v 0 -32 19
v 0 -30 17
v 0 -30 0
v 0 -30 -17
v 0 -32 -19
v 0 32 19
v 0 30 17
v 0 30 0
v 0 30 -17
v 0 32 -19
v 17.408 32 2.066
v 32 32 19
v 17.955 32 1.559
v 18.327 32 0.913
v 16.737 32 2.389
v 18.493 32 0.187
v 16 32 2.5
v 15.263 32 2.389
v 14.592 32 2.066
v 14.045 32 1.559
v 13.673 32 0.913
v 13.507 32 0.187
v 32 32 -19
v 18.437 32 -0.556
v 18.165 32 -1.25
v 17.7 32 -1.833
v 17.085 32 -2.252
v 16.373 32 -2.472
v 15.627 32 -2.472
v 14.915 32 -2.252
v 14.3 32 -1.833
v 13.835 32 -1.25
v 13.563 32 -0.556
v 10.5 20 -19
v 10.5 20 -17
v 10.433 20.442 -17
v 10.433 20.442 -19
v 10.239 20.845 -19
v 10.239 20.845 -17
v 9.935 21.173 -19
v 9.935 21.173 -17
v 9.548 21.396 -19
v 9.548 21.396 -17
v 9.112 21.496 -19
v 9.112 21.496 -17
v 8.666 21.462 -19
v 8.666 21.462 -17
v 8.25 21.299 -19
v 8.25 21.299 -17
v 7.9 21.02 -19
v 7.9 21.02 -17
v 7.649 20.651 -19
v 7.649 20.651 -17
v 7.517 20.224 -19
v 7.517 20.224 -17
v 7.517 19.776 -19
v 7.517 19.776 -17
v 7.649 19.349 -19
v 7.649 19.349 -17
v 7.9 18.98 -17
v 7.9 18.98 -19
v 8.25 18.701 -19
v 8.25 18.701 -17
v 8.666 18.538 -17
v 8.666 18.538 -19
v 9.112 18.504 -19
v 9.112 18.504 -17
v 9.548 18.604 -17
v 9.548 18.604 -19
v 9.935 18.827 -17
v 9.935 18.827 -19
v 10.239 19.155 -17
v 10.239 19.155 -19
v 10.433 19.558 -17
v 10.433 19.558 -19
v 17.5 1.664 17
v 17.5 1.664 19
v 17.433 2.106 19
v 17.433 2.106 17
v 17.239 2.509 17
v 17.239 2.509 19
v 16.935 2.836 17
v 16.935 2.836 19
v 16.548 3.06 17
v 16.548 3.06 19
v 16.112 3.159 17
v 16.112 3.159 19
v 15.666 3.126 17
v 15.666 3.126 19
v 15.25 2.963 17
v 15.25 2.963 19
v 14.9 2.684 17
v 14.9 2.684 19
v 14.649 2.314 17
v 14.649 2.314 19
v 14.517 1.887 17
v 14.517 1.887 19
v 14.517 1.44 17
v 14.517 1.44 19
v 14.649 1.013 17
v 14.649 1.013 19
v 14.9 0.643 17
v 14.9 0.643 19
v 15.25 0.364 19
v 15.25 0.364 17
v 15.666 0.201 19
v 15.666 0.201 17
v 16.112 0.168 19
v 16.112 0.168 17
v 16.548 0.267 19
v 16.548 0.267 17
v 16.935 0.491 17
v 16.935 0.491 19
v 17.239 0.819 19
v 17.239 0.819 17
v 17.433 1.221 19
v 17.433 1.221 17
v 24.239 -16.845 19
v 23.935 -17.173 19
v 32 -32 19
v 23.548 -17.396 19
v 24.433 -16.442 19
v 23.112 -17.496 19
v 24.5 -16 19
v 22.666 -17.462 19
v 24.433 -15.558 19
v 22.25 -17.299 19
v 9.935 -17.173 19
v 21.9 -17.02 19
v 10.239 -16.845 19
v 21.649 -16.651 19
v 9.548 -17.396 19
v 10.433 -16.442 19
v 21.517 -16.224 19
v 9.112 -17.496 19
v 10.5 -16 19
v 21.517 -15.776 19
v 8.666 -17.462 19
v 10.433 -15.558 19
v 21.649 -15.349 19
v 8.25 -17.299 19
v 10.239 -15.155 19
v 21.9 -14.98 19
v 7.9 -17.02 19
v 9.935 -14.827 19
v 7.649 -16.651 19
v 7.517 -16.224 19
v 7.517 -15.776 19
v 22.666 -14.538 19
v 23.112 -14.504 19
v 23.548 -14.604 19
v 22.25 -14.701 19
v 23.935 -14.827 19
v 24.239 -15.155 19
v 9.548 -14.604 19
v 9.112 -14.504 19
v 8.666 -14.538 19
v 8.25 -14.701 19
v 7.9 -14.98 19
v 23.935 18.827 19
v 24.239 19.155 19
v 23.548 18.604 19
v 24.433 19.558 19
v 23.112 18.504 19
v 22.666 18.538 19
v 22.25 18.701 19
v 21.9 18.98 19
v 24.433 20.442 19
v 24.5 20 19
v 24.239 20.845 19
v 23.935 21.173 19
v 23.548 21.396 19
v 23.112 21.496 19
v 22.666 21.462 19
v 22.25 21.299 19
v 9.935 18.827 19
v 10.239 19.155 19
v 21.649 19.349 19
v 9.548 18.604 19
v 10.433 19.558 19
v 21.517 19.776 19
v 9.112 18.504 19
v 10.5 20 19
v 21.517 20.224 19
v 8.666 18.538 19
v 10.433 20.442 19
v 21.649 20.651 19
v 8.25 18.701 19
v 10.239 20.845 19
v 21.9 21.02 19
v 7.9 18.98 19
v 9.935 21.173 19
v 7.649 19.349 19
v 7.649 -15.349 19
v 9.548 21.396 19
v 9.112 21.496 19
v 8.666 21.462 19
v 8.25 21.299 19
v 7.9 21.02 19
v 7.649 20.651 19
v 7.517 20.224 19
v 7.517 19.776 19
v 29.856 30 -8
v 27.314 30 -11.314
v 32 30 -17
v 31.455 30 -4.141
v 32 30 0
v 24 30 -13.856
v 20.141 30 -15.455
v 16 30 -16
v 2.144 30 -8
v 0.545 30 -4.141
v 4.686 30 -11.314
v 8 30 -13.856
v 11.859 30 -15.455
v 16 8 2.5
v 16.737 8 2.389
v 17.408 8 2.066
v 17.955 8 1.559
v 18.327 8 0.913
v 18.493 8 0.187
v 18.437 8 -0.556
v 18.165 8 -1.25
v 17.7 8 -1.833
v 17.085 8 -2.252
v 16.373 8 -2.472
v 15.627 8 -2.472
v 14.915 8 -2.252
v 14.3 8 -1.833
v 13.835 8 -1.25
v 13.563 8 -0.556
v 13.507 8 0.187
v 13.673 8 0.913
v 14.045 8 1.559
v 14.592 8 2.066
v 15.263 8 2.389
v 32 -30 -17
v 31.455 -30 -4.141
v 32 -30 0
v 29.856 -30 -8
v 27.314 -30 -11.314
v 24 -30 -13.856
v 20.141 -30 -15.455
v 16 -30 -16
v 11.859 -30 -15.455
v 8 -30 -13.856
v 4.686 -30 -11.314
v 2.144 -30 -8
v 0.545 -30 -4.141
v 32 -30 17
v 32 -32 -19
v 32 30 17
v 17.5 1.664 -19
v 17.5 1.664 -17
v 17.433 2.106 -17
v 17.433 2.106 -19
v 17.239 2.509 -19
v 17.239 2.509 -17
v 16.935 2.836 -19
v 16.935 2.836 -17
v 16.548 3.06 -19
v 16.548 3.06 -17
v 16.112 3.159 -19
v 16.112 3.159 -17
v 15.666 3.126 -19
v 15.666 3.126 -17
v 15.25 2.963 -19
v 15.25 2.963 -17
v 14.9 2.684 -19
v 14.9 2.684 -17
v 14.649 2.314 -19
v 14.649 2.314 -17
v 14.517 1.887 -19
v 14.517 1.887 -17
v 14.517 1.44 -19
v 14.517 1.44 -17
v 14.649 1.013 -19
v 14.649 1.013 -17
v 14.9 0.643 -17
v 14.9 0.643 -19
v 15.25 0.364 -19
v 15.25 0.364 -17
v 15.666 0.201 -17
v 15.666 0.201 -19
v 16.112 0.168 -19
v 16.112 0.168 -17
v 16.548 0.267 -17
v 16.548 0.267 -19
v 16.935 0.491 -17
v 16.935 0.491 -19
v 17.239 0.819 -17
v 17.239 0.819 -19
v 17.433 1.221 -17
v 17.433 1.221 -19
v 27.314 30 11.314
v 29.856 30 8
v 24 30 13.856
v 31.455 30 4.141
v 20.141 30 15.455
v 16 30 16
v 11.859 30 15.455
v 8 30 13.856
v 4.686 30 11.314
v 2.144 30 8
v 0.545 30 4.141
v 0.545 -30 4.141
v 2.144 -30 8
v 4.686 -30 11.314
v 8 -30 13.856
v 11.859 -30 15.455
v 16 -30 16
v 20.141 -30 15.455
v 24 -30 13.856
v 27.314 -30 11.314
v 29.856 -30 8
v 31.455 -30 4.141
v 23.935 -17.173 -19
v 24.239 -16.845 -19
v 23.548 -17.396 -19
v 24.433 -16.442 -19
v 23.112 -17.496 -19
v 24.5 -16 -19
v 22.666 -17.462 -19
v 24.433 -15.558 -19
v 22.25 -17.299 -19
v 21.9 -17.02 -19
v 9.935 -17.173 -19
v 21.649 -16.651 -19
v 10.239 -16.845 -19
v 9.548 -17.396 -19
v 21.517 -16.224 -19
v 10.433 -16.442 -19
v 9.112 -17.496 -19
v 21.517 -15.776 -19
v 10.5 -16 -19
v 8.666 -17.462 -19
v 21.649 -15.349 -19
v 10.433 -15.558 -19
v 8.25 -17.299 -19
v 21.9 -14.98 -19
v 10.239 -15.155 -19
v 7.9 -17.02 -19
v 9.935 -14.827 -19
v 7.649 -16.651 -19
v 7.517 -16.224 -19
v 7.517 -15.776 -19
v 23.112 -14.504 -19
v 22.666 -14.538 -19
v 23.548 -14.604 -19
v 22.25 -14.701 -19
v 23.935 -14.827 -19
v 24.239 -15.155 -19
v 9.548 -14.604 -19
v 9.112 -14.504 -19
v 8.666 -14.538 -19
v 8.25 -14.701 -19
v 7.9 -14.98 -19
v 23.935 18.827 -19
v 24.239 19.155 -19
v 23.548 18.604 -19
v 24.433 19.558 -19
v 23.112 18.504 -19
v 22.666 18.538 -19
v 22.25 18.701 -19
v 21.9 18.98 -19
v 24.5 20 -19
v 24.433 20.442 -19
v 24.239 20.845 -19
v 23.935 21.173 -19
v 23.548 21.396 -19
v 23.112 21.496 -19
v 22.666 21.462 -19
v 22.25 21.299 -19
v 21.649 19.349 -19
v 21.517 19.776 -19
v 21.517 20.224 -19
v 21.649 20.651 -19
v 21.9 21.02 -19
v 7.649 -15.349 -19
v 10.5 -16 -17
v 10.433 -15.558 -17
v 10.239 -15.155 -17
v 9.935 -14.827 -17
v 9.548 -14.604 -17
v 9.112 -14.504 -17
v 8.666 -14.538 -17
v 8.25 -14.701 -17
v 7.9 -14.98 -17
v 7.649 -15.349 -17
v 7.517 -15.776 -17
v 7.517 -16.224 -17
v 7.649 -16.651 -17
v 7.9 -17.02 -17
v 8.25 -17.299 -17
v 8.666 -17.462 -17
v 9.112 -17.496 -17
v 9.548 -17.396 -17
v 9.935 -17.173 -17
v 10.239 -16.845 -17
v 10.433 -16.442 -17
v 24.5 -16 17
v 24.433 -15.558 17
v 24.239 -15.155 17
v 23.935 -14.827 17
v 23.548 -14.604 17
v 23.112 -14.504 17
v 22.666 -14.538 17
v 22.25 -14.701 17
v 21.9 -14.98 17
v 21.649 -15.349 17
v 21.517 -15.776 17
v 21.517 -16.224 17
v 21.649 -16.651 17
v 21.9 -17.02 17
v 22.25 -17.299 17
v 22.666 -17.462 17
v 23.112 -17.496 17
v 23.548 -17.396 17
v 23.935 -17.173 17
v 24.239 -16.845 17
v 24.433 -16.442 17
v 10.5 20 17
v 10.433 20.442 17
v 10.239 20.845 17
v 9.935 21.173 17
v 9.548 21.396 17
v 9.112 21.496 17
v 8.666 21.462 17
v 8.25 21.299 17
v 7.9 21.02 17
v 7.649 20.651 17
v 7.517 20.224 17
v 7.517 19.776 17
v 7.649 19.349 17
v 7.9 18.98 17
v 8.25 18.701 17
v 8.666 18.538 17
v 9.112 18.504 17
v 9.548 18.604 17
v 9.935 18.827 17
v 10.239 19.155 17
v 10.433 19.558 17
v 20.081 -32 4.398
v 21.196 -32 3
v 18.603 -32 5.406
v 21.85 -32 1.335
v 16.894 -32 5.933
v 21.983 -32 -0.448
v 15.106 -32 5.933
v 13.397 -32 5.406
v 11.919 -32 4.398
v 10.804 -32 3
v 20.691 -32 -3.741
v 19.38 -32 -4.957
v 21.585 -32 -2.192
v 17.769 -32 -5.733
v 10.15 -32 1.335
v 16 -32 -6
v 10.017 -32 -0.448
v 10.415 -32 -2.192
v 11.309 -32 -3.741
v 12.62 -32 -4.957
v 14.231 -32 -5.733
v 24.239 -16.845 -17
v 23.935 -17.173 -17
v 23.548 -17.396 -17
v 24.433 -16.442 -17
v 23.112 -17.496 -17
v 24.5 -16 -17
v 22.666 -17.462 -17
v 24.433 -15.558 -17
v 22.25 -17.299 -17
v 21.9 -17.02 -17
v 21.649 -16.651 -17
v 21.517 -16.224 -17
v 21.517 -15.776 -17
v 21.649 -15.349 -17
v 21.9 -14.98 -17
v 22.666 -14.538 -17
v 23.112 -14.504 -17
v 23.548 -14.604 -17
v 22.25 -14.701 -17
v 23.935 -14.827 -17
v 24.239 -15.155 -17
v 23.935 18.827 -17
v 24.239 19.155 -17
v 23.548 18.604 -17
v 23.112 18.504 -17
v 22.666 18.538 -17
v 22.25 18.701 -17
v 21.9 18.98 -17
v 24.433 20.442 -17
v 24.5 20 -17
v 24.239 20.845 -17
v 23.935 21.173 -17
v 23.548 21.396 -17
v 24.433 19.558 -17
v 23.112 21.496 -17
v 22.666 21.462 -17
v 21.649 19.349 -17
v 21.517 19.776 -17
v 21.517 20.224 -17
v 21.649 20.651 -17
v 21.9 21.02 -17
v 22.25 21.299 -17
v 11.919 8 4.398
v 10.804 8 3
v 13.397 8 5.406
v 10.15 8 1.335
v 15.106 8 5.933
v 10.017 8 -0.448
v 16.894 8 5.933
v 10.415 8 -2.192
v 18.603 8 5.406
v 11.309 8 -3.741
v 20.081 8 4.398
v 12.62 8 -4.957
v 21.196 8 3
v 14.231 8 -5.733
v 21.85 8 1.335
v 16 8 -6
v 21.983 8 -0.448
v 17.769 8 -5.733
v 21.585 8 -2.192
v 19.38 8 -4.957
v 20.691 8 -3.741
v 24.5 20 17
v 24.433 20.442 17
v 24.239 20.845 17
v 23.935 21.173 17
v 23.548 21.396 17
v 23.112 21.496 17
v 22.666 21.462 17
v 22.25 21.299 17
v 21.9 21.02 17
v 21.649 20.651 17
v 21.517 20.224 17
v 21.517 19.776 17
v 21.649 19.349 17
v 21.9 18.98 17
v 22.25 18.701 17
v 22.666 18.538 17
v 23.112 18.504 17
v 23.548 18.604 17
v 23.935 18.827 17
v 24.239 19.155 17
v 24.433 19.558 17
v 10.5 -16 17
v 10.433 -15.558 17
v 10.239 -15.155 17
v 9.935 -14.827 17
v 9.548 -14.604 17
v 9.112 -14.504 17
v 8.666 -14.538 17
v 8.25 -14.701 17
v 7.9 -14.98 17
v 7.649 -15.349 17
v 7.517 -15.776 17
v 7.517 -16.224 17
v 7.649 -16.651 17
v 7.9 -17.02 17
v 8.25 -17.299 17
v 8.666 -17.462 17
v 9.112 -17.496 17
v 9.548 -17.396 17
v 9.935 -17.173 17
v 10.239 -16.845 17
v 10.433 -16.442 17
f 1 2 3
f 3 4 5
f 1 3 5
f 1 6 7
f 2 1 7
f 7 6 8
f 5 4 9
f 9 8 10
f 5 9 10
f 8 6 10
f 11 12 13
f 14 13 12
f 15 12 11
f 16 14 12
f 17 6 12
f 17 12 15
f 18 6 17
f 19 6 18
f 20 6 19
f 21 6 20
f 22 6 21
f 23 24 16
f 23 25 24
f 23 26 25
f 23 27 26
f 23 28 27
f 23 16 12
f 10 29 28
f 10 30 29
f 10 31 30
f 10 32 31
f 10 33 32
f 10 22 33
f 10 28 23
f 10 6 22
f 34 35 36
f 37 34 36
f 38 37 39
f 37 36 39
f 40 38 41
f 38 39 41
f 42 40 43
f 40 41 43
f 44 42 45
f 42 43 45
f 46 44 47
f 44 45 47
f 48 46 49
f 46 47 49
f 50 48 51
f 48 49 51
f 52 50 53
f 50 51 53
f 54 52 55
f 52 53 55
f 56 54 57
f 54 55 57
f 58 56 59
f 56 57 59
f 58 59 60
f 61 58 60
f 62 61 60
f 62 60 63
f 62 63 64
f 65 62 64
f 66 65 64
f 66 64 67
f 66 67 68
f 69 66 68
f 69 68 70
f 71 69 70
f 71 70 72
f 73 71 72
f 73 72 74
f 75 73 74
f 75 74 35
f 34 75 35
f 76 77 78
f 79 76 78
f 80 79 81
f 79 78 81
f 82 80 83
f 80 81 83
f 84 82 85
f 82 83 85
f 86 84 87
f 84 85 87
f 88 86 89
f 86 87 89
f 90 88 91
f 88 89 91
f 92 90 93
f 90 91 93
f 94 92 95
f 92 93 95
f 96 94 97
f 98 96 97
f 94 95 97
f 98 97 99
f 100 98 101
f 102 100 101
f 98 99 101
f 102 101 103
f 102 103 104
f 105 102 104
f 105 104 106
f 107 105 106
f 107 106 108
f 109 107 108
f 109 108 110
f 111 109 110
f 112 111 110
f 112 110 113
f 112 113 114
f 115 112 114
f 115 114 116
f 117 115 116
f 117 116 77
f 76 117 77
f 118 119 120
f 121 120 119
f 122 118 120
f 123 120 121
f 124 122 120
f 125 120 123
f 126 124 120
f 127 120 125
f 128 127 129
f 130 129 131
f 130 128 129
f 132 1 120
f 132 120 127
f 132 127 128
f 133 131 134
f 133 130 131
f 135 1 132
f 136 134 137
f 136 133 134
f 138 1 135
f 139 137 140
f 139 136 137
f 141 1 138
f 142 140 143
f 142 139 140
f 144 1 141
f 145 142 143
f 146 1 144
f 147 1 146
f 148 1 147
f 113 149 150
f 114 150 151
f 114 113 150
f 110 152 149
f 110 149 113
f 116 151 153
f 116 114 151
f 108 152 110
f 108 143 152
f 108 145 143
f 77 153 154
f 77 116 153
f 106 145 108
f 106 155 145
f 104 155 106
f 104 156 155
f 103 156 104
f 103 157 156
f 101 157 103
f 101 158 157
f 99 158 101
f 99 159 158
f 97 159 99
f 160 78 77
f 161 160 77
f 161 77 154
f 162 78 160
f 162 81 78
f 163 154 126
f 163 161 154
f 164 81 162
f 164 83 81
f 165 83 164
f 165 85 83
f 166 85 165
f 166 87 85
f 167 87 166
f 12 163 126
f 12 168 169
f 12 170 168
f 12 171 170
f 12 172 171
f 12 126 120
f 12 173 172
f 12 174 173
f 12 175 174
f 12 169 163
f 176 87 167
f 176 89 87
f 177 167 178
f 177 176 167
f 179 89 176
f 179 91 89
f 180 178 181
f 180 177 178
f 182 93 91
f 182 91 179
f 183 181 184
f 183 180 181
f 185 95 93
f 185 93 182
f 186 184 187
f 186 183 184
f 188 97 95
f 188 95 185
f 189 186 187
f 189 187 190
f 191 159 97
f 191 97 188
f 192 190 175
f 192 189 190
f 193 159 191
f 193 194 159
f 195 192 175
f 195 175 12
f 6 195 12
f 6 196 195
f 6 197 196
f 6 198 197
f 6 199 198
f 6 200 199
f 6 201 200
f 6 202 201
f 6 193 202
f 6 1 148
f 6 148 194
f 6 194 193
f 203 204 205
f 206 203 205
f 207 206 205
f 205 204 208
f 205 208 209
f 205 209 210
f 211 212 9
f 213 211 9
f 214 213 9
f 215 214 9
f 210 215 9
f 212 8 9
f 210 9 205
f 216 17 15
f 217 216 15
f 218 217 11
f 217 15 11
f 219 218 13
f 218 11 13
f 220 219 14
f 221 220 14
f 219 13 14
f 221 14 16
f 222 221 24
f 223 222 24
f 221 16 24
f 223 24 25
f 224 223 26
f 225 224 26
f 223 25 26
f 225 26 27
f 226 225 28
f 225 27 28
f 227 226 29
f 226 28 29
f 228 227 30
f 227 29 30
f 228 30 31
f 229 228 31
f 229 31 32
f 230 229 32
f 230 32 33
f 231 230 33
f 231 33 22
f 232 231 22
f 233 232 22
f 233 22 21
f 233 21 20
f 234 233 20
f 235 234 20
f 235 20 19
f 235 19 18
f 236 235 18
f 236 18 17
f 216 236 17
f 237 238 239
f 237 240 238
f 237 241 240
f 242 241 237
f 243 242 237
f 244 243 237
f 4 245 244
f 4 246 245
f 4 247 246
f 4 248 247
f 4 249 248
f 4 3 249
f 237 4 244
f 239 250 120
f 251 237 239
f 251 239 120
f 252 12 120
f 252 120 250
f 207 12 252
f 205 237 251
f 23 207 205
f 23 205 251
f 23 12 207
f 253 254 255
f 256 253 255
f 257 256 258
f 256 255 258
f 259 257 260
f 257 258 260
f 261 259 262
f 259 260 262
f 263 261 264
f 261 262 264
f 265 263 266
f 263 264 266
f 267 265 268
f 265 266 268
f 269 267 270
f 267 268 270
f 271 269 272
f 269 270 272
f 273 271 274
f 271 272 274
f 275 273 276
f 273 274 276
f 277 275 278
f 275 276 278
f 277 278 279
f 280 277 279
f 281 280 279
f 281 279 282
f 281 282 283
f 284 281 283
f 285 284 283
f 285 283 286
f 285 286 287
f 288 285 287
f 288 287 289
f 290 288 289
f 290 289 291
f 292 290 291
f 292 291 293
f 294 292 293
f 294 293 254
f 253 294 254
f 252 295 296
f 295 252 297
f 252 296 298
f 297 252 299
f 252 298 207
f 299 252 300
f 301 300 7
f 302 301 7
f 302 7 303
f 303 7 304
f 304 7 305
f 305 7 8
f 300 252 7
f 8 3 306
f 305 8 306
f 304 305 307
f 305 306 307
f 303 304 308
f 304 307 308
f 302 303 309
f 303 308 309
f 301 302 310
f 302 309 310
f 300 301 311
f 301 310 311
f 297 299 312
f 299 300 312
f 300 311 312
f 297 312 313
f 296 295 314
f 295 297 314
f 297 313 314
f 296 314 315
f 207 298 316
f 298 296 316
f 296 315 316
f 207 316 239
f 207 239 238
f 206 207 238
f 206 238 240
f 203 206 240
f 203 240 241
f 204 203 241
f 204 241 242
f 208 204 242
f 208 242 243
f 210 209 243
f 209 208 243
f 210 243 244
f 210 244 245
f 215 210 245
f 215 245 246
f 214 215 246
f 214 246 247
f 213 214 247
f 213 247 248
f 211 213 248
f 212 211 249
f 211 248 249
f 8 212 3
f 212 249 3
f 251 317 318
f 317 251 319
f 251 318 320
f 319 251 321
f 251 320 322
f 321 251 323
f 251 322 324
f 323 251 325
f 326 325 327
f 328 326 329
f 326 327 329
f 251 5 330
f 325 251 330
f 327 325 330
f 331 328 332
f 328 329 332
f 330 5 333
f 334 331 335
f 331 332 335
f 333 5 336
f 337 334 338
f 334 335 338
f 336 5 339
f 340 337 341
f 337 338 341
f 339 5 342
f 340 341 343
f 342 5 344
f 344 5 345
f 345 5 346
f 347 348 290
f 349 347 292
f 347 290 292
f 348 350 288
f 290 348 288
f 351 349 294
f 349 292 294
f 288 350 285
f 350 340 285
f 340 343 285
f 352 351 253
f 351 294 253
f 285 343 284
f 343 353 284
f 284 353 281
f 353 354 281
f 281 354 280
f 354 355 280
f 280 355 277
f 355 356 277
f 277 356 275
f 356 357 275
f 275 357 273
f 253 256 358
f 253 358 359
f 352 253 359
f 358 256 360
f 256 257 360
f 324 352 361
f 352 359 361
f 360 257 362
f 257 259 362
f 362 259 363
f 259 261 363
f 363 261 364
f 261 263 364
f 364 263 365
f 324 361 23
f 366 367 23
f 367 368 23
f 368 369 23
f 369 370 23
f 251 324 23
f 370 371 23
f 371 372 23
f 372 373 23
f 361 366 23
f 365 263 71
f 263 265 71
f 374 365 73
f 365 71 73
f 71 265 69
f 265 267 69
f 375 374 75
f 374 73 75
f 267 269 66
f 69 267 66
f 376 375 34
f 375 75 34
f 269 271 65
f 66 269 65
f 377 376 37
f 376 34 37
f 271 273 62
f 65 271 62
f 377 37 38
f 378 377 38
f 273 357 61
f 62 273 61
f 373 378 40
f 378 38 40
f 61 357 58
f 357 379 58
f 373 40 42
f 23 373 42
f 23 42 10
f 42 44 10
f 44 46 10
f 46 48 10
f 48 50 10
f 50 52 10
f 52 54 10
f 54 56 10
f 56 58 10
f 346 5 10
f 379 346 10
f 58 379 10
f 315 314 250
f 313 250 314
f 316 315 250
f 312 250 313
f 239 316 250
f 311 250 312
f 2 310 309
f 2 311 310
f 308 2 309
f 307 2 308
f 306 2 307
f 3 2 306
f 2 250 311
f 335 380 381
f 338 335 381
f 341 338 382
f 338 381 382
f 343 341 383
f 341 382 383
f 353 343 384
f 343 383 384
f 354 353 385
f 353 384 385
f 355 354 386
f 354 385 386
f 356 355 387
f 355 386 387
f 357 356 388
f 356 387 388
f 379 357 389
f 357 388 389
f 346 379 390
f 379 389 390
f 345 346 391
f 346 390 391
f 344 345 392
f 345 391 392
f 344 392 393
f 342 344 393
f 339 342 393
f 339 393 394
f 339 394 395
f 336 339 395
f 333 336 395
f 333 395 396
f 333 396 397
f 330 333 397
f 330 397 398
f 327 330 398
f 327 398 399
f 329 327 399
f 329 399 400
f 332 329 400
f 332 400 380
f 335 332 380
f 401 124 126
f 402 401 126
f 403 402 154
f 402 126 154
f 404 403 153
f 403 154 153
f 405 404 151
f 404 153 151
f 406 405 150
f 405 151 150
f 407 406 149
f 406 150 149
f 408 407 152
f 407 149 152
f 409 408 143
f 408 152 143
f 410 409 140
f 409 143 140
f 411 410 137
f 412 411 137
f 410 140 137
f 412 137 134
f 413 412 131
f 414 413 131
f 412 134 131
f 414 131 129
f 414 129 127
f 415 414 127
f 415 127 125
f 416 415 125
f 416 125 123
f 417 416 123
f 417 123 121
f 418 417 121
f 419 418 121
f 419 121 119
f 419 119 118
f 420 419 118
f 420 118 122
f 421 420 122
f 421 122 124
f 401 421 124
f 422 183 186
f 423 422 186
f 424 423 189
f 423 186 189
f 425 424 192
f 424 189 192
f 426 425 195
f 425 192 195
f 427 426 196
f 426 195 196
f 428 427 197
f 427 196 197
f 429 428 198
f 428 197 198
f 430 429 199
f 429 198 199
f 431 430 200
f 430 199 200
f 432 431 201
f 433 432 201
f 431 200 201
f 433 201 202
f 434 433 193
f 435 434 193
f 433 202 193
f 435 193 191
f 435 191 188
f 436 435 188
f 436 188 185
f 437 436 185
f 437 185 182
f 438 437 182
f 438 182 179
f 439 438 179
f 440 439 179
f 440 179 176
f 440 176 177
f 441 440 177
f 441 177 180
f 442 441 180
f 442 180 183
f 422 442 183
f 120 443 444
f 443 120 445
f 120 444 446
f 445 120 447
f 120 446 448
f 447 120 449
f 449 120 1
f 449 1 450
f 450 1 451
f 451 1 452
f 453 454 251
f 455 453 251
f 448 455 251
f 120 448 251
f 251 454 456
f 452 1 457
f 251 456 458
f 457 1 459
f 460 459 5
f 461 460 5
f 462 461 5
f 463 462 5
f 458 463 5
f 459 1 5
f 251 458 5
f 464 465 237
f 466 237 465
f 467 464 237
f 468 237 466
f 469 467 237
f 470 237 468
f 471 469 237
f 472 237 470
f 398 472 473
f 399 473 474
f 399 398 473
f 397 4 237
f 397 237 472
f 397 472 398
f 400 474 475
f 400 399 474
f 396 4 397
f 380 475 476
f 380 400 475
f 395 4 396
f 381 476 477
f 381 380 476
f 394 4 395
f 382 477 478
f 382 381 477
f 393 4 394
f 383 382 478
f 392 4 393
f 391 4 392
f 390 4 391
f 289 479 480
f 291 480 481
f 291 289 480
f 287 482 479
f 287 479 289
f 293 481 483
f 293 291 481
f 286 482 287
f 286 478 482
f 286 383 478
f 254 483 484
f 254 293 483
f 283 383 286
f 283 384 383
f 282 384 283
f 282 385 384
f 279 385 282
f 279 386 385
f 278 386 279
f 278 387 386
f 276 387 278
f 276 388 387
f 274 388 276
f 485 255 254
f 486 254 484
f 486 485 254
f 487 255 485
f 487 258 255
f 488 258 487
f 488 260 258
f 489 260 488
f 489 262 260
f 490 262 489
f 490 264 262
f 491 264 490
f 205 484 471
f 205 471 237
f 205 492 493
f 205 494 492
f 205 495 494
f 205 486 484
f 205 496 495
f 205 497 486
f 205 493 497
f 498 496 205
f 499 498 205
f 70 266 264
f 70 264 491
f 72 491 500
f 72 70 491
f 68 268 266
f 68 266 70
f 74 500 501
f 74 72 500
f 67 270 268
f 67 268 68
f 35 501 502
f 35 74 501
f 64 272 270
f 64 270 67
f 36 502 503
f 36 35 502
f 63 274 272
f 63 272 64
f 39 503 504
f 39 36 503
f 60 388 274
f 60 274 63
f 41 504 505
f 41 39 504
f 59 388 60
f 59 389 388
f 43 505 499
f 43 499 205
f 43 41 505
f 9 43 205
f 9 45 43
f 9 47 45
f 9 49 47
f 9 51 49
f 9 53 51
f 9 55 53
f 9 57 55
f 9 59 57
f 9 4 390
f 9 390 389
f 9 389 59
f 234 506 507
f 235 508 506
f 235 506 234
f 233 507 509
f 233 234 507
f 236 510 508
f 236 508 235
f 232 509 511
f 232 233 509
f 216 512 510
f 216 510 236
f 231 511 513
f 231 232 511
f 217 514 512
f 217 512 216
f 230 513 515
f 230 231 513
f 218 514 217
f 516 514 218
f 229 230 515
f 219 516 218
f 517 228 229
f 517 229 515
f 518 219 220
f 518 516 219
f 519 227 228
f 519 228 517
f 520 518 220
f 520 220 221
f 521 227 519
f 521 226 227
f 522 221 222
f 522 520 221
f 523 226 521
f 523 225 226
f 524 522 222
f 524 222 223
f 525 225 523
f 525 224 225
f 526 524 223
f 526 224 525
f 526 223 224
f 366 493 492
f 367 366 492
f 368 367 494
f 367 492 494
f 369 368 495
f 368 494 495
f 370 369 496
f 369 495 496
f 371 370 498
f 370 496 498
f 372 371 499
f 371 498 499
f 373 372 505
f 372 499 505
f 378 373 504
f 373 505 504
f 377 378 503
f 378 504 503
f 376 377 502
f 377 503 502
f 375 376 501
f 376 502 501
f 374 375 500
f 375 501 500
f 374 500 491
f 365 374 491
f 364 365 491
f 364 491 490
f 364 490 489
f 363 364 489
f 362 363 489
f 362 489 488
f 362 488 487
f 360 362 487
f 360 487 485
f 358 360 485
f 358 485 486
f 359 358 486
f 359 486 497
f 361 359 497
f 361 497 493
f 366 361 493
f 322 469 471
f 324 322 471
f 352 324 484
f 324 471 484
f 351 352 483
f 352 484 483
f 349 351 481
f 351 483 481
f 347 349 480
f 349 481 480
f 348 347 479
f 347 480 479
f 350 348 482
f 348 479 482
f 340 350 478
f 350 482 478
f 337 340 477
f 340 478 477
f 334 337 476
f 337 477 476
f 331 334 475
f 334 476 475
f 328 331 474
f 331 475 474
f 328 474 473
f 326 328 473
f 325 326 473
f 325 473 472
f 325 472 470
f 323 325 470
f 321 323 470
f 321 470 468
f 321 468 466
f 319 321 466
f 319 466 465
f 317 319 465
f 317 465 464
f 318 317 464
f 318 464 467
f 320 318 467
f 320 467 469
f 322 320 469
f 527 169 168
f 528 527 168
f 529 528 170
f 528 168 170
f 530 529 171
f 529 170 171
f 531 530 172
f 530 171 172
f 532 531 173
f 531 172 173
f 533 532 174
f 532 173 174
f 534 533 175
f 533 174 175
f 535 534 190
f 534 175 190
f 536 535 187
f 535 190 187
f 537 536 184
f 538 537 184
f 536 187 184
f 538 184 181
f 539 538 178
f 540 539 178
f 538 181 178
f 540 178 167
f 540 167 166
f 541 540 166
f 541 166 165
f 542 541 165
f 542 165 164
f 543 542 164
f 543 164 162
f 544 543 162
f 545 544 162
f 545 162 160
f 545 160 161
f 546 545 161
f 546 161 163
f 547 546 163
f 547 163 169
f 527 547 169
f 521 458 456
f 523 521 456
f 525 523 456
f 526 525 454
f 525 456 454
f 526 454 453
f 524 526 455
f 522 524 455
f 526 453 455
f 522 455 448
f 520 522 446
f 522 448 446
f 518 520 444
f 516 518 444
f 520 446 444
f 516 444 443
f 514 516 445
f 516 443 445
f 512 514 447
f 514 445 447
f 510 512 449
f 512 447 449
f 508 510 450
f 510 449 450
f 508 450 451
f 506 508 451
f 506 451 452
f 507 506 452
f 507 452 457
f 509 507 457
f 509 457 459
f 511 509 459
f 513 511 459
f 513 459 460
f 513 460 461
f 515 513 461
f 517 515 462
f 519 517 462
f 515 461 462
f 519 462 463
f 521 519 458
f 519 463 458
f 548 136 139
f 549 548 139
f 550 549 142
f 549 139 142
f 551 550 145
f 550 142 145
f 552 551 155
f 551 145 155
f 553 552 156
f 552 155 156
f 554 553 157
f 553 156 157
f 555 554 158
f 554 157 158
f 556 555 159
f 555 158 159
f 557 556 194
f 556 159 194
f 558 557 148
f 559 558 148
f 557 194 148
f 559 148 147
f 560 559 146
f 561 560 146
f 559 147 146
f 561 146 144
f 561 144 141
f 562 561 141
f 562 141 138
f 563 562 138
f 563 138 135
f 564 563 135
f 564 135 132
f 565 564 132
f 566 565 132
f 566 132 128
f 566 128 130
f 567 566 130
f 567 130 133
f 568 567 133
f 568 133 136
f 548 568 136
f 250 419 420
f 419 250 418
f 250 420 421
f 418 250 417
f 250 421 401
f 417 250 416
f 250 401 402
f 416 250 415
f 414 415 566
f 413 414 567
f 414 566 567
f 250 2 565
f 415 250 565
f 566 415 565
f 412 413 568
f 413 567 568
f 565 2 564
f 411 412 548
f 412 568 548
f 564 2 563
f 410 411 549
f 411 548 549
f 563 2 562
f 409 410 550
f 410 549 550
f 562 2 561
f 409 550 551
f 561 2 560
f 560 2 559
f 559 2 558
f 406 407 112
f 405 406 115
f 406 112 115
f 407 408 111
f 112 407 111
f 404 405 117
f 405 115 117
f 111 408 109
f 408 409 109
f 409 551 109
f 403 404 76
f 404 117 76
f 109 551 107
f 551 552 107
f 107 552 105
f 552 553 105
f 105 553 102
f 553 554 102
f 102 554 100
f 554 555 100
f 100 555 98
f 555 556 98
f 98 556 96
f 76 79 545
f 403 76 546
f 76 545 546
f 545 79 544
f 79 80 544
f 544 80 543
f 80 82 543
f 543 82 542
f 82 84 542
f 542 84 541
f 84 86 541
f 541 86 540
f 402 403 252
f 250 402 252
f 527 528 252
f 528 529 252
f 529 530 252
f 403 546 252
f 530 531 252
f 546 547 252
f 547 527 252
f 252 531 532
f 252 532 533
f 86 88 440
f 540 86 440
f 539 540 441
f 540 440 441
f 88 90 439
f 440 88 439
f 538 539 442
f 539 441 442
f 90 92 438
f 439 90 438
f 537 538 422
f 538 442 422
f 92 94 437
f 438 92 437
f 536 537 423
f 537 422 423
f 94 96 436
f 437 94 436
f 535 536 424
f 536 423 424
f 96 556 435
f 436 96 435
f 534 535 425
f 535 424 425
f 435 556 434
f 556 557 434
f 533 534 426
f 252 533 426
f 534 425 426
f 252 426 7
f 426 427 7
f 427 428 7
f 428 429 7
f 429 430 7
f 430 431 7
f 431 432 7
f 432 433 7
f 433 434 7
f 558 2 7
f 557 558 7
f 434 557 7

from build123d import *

# Parameters (mm, degrees)
SKETCH1_W           = 38
SKETCH1_H           = 64
SKETCH1_W_2         = 34
SKETCH1_H_2         = 60
BOSS_EXTRUDE1_DEPTH = 32
SKETCH2_R           = 1.5
CUT_EXTRUDE1_DEPTH  = 60.093146811
BOSS_EXTRUDE3_REACH = 74.312
SKETCH7_R           = 16
SKETCH8_R           = 2.5
CUT_EXTRUDE2_DEPTH  = 75.033776076
SKETCH9_R           = 6
CUT_EXTRUDE3_DEPTH  = 40


with BuildPart() as part:
    # Sketch1 → Boss-Extrude1 (new body)
    with BuildSketch(Plane(origin=(0, 0, 0), x_dir=(0, 0, -1), z_dir=(1, 0, 0))):
        Rectangle(SKETCH1_W, SKETCH1_H)
        Rectangle(SKETCH1_W_2, SKETCH1_H_2, mode=Mode.SUBTRACT)
    extrude(amount=BOSS_EXTRUDE1_DEPTH)

    # Sketch2 → Cut-Extrude1 (cut, through all)
    with BuildSketch(Plane.XY.offset(19)):
        with Locations((9, 20)):
            Circle(SKETCH2_R)
        with Locations((23, 20)):
            Circle(SKETCH2_R)
        with Locations((16, 1.663521733)):
            Circle(SKETCH2_R)
        with Locations((9, -16)):
            Circle(SKETCH2_R)
        with Locations((23, -16)):
            Circle(SKETCH2_R)
    extrude(amount=-CUT_EXTRUDE1_DEPTH, mode=Mode.SUBTRACT)

    # Sketch7 → Boss-Extrude3 (add, up to next)
    with BuildSketch(Plane(origin=(0, -30, 0), x_dir=(1, 0, 0), z_dir=(0, 1, 0)), mode=Mode.PRIVATE) as boss_extrude3_sk1:
        with Locations(Location((16, 0, 0), (0, 0, 180))):
            Circle(SKETCH7_R)
    boss_extrude3_tool1 = extrude(boss_extrude3_sk1.sketch, amount=BOSS_EXTRUDE3_REACH, mode=Mode.PRIVATE) - part.part
    add(boss_extrude3_tool1.solids().sort_by_distance((16, -30, 0))[0])

    # Sketch8 → Cut-Extrude2 (cut, through all)
    with BuildSketch(Plane(origin=(0, 32, 0), x_dir=(1, 0, 0), z_dir=(0, 1, 0))):
        with Locations(Location((16, 0, 0), (0, 0, 270))):
            Circle(SKETCH8_R)
    extrude(amount=-CUT_EXTRUDE2_DEPTH, mode=Mode.SUBTRACT)

    # Sketch9 → Cut-Extrude3 (cut)
    with BuildSketch(Plane.XZ.offset(32)):
        with Locations(Location((16, 0, 0), (0, 0, 270))):
            Circle(SKETCH9_R)
    extrude(amount=-CUT_EXTRUDE3_DEPTH, mode=Mode.SUBTRACT)


solid = part.part
